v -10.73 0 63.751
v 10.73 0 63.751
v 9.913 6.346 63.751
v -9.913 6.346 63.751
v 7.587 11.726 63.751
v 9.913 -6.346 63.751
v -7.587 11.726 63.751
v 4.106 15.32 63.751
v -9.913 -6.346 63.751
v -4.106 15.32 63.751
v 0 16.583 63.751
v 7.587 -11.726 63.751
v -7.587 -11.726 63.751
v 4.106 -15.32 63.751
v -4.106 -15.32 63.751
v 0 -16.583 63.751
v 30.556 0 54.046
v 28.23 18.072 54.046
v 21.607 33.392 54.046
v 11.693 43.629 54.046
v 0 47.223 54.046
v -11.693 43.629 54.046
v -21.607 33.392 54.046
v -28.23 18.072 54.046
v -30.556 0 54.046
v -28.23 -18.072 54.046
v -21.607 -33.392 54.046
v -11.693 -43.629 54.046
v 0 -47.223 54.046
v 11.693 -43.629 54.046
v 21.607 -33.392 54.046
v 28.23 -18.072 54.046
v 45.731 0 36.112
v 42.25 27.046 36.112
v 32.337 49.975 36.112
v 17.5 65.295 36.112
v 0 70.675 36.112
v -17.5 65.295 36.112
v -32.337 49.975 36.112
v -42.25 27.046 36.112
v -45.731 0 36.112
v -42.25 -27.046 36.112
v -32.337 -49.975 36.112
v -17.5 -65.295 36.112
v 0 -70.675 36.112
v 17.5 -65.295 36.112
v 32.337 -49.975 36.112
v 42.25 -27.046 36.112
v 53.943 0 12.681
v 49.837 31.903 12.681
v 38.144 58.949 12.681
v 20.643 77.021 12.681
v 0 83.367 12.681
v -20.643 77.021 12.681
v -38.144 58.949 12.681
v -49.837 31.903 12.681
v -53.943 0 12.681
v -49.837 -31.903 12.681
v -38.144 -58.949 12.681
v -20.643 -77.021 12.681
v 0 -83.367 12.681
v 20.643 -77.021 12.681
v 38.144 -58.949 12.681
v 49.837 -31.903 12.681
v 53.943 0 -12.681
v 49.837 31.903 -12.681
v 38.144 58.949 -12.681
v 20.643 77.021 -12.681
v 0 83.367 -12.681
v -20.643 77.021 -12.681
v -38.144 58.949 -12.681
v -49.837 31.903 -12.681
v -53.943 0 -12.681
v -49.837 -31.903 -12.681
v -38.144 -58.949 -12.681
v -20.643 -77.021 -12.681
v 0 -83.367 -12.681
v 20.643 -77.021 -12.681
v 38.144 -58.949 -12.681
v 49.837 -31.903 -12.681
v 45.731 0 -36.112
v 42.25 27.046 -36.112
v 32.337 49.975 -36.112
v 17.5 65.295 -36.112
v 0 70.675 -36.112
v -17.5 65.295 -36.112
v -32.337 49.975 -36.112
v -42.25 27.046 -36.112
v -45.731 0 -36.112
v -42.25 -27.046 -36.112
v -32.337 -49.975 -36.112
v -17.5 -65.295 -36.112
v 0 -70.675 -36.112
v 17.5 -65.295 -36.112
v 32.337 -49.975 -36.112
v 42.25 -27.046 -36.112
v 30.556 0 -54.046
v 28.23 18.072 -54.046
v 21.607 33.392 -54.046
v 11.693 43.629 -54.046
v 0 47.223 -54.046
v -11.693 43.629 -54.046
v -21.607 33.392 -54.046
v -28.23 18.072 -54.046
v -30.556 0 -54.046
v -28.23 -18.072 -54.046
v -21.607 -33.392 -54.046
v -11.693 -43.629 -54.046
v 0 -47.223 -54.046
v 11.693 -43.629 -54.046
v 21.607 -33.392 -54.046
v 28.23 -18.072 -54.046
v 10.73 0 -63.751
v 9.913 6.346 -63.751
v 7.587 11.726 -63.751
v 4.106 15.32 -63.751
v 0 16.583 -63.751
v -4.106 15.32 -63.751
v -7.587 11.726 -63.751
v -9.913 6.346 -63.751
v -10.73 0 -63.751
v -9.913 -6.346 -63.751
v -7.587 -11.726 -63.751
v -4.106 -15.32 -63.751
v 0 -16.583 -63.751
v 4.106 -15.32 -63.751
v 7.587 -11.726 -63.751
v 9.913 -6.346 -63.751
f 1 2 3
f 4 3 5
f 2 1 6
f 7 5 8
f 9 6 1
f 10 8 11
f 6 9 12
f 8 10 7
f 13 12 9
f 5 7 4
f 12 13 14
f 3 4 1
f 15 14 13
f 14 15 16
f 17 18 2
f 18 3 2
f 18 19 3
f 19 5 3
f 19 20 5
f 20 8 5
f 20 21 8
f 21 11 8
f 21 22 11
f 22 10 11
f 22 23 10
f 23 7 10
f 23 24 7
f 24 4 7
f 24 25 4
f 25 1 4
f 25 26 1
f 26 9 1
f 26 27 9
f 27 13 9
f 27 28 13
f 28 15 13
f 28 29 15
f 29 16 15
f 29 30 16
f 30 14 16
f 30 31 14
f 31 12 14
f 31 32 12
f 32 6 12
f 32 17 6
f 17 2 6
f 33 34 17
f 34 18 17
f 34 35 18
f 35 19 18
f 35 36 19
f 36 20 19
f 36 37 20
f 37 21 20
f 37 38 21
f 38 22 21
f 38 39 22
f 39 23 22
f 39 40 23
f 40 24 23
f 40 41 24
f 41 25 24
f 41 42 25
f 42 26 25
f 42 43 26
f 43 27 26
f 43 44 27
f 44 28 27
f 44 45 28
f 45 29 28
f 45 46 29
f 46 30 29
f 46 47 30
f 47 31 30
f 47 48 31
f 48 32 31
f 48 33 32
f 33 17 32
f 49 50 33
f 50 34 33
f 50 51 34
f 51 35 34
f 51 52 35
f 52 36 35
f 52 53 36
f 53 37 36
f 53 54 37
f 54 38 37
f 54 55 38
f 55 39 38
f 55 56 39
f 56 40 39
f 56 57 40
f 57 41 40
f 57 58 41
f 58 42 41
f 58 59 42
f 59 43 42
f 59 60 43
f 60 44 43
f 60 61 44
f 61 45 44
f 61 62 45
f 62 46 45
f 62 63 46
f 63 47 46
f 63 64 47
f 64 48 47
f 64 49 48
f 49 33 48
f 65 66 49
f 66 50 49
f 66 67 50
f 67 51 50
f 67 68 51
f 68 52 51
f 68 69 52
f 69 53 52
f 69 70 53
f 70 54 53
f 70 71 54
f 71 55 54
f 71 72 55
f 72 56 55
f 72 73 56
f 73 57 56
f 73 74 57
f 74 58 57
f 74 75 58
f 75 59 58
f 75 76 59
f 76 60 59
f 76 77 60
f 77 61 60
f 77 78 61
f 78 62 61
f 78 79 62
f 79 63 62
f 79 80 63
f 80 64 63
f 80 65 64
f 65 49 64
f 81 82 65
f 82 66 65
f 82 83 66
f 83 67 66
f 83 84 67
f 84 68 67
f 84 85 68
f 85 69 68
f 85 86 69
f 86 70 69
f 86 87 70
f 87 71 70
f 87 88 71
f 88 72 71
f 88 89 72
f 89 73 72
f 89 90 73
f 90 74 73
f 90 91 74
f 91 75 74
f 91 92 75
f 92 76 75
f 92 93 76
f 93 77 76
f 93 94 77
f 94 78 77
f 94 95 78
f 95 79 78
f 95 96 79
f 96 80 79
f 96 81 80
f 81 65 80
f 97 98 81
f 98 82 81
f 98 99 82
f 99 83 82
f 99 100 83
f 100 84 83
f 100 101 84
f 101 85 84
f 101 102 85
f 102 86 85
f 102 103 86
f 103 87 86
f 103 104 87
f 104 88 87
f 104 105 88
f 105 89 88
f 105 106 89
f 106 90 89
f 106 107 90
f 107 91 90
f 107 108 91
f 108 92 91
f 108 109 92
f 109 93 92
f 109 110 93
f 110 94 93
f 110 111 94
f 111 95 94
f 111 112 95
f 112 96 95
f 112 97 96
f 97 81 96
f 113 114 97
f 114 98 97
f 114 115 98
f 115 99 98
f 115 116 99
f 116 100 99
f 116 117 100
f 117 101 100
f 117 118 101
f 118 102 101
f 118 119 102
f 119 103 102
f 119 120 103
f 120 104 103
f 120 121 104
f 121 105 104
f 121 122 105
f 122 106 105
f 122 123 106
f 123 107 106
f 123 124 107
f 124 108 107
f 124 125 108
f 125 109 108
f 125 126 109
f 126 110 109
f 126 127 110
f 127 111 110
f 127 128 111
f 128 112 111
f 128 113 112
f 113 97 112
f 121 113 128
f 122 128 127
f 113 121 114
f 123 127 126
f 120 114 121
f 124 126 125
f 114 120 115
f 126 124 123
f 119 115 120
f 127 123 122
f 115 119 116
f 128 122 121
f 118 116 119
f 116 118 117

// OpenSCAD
// Generated by SolidPython 1.0.1 on 2020-07-29 00:46:50


scale(v = [11, 17, 13]) {
	sphere(r = 5);
}
/***********************************************
*********      SolidPython code:      **********
************************************************
 
# import packages: SolidPython
from solid import *
from solid.utils import *
from itertools import chain, combinations, permutations


class Resize:

    def __init__(self, scad_file):
        self.scad_file = scad_file
        #self.scad_file = import_scad(scad_file)
        # cone/cylinder param:
        self.r1 = 0
        self.r2 = 0
        self.h = 0
        # rectangular prism param:
        self.w = 0
        self.l = 0
        # ellipse param:
        self.r = 0

    # import OpenScad code (file name corresponds to shape)


    # classify shape + parameters
    def assign(self, param1, param2, param3):
        if self.scad_file == 'cone.scad':
            self.r1 = param1
            self.r2 = param2
            self.h = param3
        elif self.scad_file == 'cylinder.scad':
            self.r1 = param1
            self.r2 = param2
            self.h = param3
        elif self.scad_file == 'rectangularPrism.scad':
            self.h = param1
            self.l = param2
            self.w = param3
        else:
            self.r = param1
            self.h = param2

    # resize parameters
    def iterate(self):
        x = range(3, 20, 2)
        i = 1
        if self.scad_file == 'cone.scad':
            tempList = list(permutations(x, 2))
            for temp in tempList:
                param1 = temp[0]
                param2 = temp[1]
                filepath = 'produced_scad_files/' + 'cone' + str(param1) + '_' + str(param2) + '_' + '.scad'
                scad_render_to_file(cylinder(h=param1, r1=param2, r2=0), filepath)

        elif self.scad_file == 'cylinder.scad':
            tempList = list(permutations(x, 3))
            for temp in tempList:
                param1 = temp[0]
                param2 = temp[1]
                filepath = 'produced_scad_files/' + 'cylinder' + str(param1) + '_' + str(param2) + '_' + '.scad'
                scad_render_to_file(cylinder(h=param1, r1=param2, r2=param2), filepath)

        elif self.scad_file == 'rectangularPrism.scad':
            tempList = list(permutations(x, 3))
            for temp in tempList:
                param1 = temp[0]
                param2 = temp[1]
                param3 = temp[2]
                filepath = 'produced_scad_files/' + 'rectangularPrism' + str(param1) + '_' + str(param2) + '_' + str(
                    param3) + '.scad'
                scad_render_to_file(cube(size=(param1, param2, param3)), filepath)

        elif self.scad_file == 'ellipse.scad':
            tempList = list(permutations(x, 4))
            for temp in tempList:
                param1 = temp[0]
                param2 = temp[1]
                param3 = temp[2]
                param4 = temp[3]
                filepath = 'produced_scad_files/' + 'ellipse' + str(param1) + '_' + str(param2) + '_' + str(param3) + '_' + str(param4) + '.scad'
                scad_render_to_file(scale([param1, param2, param3])(sphere(r=param4)), filepath)

    def render_to_scadfile(self):
        scad_render_to_file(scad, 'example.scad') 
 
************************************************/
